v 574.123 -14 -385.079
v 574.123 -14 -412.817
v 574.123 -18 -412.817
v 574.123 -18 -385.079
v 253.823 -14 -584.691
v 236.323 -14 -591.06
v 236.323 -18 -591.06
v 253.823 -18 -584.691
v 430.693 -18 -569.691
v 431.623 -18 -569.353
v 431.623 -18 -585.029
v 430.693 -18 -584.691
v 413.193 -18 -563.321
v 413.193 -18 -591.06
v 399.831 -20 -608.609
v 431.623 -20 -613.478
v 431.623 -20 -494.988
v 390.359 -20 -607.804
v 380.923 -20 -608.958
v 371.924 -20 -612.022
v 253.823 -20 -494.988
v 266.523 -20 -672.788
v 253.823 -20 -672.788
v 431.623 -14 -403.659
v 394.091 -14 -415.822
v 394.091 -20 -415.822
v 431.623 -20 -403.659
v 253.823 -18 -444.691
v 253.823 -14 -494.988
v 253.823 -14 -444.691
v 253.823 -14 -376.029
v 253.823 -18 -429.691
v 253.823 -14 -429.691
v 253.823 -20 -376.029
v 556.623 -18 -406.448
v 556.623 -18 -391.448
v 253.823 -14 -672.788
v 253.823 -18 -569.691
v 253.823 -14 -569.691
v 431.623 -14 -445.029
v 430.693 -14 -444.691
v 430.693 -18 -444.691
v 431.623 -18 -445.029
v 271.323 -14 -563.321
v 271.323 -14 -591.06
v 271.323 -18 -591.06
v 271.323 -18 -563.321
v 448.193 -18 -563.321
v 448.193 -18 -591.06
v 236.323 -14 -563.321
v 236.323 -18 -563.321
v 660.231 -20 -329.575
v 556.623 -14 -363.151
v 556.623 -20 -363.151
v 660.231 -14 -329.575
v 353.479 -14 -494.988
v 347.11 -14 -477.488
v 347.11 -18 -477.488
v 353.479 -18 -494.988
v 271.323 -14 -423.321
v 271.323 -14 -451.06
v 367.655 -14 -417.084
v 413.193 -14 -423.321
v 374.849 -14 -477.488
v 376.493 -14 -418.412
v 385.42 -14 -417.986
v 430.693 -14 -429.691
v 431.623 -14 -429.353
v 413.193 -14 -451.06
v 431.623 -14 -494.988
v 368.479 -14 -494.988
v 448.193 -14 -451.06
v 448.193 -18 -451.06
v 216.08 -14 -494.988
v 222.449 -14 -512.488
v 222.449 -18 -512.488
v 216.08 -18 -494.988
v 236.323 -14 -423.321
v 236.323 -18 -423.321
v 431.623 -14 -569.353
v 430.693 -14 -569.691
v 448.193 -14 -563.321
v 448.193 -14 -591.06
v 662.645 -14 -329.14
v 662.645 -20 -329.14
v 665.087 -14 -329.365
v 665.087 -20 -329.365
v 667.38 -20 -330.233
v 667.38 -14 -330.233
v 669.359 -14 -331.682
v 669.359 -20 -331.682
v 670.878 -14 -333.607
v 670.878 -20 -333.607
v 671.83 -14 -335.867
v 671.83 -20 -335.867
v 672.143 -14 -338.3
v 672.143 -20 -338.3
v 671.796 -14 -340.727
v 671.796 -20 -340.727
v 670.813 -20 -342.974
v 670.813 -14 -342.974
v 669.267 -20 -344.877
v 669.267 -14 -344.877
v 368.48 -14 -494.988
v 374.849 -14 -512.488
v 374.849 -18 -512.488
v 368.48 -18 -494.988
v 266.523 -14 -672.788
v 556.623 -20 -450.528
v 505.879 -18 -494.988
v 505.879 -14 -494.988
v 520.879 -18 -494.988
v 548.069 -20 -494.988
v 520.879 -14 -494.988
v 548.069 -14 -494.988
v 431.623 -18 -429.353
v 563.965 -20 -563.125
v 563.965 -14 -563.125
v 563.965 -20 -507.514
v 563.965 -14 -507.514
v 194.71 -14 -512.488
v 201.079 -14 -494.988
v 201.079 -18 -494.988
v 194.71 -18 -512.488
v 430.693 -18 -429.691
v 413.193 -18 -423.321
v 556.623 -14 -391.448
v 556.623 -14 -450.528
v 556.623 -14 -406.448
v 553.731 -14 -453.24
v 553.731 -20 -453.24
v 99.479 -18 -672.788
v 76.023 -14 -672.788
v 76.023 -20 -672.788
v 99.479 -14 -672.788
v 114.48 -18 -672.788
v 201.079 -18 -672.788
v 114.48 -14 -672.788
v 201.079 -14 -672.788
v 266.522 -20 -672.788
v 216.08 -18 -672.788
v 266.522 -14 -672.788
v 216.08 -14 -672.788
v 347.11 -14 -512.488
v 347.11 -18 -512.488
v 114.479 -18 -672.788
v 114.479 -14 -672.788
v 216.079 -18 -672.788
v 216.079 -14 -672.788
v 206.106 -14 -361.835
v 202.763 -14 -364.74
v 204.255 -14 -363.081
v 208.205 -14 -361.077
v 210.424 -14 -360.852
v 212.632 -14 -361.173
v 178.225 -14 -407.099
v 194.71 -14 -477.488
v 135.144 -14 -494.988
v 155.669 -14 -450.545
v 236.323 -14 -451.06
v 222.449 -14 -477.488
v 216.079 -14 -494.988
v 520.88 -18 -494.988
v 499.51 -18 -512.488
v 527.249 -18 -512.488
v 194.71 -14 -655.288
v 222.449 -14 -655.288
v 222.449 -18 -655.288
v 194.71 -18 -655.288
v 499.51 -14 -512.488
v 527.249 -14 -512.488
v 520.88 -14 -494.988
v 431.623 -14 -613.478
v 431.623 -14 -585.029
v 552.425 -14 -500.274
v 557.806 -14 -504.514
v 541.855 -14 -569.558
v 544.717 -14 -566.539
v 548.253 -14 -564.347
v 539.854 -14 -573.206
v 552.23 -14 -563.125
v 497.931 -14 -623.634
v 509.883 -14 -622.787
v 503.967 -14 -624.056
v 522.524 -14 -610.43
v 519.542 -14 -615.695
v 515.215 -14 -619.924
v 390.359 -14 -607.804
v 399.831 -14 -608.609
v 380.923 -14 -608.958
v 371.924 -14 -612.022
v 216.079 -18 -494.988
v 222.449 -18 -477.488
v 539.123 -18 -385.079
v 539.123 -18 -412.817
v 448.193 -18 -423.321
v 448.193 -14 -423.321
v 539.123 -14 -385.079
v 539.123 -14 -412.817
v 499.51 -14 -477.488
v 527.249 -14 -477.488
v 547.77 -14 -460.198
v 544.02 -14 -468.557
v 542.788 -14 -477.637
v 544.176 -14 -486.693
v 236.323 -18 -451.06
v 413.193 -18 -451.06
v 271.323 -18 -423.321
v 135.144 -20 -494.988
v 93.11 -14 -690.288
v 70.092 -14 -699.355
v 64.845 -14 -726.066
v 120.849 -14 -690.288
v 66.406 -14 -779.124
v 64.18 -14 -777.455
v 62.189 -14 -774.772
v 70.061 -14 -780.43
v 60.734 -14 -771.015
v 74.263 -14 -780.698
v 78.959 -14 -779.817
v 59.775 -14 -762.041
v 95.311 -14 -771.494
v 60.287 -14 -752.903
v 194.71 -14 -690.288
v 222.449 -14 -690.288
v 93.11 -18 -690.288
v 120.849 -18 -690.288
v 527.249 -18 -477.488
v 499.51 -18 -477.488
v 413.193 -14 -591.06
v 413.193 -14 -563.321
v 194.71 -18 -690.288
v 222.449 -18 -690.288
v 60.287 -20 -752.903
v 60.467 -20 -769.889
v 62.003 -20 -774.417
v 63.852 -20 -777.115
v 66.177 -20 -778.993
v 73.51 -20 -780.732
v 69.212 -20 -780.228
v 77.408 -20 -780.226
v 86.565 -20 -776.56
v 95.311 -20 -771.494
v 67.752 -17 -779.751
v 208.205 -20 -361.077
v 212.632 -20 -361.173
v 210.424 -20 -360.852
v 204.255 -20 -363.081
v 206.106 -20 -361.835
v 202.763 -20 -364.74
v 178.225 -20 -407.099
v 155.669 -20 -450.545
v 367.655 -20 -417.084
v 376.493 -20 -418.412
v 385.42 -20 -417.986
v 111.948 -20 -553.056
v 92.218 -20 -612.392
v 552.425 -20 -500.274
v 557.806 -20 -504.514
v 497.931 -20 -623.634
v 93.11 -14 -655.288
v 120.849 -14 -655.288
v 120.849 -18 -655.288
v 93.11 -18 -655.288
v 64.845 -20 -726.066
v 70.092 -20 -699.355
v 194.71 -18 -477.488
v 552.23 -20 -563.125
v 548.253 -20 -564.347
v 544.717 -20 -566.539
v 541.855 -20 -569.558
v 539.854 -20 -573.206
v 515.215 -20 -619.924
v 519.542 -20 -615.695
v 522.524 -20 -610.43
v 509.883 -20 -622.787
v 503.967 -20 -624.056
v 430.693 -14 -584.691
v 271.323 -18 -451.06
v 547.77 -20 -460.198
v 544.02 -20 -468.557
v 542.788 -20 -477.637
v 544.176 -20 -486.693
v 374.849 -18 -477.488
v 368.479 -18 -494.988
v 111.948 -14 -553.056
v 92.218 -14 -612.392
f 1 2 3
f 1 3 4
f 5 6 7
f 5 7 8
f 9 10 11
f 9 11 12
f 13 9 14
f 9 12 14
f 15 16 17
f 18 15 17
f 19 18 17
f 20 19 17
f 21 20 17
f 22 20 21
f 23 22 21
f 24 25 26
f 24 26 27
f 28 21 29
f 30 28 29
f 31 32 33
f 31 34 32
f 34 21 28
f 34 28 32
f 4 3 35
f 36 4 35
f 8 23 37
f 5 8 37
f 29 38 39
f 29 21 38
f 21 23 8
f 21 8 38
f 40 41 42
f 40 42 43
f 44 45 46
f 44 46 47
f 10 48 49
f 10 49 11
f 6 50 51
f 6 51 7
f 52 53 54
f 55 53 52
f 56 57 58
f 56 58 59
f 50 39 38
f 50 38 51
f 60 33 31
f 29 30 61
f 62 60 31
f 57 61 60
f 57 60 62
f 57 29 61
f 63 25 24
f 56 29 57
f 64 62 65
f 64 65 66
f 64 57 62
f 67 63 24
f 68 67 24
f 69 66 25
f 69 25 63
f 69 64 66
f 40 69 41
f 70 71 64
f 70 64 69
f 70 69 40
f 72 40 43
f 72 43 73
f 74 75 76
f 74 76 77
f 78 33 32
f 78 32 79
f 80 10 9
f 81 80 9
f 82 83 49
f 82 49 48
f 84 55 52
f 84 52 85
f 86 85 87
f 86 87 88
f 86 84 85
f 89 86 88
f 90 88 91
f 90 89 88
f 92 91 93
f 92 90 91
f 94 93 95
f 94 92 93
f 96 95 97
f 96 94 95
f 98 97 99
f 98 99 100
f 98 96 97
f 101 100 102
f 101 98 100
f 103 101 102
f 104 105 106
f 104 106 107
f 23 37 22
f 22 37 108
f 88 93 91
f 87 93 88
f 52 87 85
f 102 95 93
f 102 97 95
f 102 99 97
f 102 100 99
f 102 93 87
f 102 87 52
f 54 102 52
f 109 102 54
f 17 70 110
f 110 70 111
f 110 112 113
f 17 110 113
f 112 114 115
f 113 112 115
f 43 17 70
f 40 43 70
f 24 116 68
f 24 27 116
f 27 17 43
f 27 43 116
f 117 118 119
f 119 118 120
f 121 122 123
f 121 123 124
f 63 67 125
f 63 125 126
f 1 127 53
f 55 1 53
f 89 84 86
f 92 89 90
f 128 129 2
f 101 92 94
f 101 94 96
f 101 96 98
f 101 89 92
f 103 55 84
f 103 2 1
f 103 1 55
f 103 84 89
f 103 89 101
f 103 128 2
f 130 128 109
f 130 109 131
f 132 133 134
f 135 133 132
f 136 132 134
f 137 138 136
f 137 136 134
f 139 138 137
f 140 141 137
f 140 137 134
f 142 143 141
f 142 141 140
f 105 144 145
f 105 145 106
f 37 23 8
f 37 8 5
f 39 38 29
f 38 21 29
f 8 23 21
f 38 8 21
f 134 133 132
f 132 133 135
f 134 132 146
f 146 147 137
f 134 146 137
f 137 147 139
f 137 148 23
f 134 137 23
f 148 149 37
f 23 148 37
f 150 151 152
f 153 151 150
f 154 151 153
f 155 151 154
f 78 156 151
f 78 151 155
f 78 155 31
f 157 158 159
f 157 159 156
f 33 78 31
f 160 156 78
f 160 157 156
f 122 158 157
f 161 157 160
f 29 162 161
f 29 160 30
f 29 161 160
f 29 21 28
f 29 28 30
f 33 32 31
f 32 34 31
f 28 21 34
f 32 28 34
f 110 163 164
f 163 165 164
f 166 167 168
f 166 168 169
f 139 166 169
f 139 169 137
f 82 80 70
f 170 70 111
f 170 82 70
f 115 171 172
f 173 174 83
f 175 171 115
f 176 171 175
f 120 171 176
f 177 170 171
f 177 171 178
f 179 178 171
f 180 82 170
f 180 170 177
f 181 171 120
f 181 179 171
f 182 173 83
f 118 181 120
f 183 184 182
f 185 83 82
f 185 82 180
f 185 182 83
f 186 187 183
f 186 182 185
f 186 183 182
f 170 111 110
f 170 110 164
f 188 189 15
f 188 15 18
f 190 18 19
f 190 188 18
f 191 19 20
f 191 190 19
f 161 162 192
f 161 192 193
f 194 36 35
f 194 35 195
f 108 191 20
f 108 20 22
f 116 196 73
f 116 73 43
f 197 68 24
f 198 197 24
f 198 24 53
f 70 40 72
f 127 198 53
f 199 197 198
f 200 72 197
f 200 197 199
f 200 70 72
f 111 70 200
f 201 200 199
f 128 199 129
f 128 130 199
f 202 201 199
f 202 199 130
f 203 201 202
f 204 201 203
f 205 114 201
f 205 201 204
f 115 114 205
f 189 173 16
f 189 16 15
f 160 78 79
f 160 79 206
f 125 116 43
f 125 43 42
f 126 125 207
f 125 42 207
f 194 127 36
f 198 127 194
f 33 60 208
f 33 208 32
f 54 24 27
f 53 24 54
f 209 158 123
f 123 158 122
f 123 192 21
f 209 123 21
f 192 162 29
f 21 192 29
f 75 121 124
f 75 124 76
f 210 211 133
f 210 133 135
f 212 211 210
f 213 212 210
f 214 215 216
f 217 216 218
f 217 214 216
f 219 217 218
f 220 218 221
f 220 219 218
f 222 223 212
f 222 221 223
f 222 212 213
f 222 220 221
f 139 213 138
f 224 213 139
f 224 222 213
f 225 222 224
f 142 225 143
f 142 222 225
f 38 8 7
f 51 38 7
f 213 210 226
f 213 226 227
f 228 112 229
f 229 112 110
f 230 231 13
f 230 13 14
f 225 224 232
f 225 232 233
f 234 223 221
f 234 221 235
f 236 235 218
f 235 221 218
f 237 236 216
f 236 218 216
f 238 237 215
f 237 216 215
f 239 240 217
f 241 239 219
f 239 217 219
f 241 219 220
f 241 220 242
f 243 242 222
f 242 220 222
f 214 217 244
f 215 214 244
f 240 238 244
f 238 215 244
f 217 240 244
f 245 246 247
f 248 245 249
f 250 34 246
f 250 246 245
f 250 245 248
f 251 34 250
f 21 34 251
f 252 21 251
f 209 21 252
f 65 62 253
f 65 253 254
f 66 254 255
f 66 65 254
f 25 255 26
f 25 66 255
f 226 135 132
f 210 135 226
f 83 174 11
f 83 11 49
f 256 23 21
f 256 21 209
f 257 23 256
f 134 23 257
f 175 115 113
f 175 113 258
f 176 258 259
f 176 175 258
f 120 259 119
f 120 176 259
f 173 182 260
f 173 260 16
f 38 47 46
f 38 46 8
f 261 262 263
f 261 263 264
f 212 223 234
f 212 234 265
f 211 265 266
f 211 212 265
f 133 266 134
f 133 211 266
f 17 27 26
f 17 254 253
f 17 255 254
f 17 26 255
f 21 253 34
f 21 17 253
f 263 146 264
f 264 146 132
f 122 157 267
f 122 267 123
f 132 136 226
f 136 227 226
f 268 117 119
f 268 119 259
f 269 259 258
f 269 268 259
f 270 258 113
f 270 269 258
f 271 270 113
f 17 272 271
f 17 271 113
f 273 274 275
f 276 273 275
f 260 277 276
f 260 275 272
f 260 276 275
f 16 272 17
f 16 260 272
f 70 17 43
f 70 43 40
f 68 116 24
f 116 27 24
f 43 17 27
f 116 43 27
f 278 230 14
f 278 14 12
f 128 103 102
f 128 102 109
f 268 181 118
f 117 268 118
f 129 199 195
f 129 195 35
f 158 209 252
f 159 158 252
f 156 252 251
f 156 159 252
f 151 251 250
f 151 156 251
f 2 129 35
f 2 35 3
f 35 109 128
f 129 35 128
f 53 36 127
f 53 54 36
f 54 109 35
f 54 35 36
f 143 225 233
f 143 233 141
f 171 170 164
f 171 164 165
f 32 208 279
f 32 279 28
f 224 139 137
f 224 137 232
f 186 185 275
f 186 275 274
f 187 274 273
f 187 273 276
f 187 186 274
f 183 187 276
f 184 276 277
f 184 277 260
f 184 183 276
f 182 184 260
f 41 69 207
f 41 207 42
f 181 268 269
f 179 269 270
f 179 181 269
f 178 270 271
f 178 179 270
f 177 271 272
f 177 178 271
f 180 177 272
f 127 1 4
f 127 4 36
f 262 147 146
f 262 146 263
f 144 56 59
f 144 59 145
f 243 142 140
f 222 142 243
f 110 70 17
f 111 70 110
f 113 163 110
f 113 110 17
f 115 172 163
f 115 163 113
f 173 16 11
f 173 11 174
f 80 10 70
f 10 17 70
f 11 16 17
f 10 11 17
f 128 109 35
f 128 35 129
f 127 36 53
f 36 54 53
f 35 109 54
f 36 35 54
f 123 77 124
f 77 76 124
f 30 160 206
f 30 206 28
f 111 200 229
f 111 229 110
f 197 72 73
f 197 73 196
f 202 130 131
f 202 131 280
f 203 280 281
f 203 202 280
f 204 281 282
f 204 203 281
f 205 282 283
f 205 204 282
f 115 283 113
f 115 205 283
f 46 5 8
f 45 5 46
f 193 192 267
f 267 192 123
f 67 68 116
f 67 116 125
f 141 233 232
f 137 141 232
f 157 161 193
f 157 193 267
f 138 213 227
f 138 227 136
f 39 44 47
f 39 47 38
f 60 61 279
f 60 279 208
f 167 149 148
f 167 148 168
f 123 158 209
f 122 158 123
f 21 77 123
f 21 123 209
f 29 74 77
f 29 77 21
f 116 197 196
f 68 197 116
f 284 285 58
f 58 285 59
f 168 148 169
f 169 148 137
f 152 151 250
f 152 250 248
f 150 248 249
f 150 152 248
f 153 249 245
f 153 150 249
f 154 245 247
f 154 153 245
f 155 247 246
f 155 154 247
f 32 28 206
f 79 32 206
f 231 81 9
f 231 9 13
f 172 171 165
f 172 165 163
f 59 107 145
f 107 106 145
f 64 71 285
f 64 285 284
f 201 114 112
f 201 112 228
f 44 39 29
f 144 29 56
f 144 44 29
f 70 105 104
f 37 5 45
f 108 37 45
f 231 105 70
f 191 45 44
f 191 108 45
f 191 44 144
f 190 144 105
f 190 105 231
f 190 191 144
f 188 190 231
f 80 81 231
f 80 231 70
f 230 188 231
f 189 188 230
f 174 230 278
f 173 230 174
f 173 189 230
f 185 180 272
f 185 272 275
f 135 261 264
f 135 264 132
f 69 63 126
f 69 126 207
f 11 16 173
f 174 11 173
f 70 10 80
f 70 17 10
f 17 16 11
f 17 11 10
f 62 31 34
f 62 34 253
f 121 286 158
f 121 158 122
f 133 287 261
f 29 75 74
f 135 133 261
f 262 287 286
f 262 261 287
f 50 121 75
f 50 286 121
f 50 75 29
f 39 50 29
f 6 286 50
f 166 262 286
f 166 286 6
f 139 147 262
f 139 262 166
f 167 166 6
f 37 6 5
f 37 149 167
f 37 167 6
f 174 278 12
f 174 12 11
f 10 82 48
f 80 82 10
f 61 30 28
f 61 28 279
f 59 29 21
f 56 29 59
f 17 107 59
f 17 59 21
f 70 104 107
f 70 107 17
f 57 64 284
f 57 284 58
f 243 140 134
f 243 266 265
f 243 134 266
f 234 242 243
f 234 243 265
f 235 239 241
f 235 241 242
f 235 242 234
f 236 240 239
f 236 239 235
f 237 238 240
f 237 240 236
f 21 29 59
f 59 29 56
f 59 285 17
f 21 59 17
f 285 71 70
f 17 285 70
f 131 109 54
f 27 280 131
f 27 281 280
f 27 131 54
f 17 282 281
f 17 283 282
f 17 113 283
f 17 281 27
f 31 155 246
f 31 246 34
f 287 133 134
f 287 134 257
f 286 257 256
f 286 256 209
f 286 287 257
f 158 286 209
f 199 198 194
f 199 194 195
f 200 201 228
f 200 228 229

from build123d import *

# Parameters (mm, degrees)
BOSS_EXTRUDE1_DEPTH            = 40
F_13_0_13_DIAMETER_HOLE1_D     = 13
F_13_0_13_DIAMETER_HOLE1_DEPTH = 29
CUT_EXTRUDE8_DEPTH             = 16
SKETCH14_R                     = 6.35
SKETCH14_R_2                   = 5.502637429
CUT_EXTRUDE9_DEPTH             = 10
CUT_EXTRUDE10_DEPTH            = 10
BOSS_EXTRUDE2_DEPTH            = 24
BOSS_EXTRUDE3_START            = -40
BOSS_EXTRUDE3_DEPTH            = 40
CUT_EXTRUDE11_DEPTH            = 34
CUT_EXTRUDE12_START            = -672.787815527
CUT_EXTRUDE12_OUTLINE_W        = 473
CUT_EXTRUDE12_OUTLINE_H        = 6
CUT_EXTRUDE12_DEPTH            = 0.0001
CUT_EXTRUDE12_START_2          = -494.987815527
CUT_EXTRUDE12_2_OUTLINE_W      = 473
CUT_EXTRUDE12_2_OUTLINE_H      = 6
CUT_EXTRUDE12_2_DEPTH          = 0.0001
CUT_EXTRUDE13_START            = 253.822659289
CUT_EXTRUDE13_OUTLINE_W        = 6
CUT_EXTRUDE13_OUTLINE_H        = 27.629935764
CUT_EXTRUDE13_OUTLINE_H_2      = 46.868729155
CUT_EXTRUDE13_OUTLINE_H_3      = 44.459740095
CUT_EXTRUDE13_DEPTH            = 0.0001
CUT_EXTRUDE13_START_2          = 431.622659289
CUT_EXTRUDE13_2_OUTLINE_W      = 6
CUT_EXTRUDE13_2_OUTLINE_H      = 46.868729155
CUT_EXTRUDE13_2_OUTLINE_H_2    = 44.459740095
CUT_EXTRUDE13_2_DEPTH          = 0.0001
CUT_EXTRUDE13_START_3          = 556.622559289
CUT_EXTRUDE13_3_OUTLINE_W      = 6
CUT_EXTRUDE13_3_OUTLINE_H      = 87.376935067
CUT_EXTRUDE13_3_DEPTH          = 0.0001
CUT_EXTRUDE14_DEPTH            = 4


# Read off the part's stored shape, not the designer's step: Cut-Extrude12, Cut-Extrude13
with BuildPart() as part:
    # Sketch1 → Boss-Extrude1 (new body)
    with BuildSketch(Plane(origin=(0, 20, 0), x_dir=(1, 0, 0), z_dir=(0, 1, 0))):
        with BuildLine():
            Line((563.96485174, 507.513718698), (563.96485174, 562.736423486))
            Line((563.96485174, 562.736423486), (554.690781869, 562.894803628))
            ThreePointArc((554.690781869, 562.894803628), (545.704943994, 565.795150829), (539.853906856, 573.206133263))
            Line((539.853906856, 573.206133263), (522.524343645, 610.429990226))
            ThreePointArc((522.524343645, 610.429990226), (512.649800976, 621.543175495), (497.931198247, 623.634159339))
            Line((497.931198247, 623.634159339), (399.830947056, 608.608698386))
            ThreePointArc((399.830947056, 608.608698386), (385.610832142, 608.137408426), (371.923585817, 612.02238853))
            Line((371.923585817, 612.02238853), (95.310746964, 771.494097008))
            add(Edge.make_bspline(
                [(60.287007155, 752.902507236), (59.408683029, 762.769524202), (58.560960325, 776.204376236), (76.94287295, 783.298520304), (86.753146937, 776.493697586), (95.310746964, 771.494097008)],
                knots=[0, 0, 0, 0, 0.5, 0.5, 1, 1, 1, 1], degree=3))
            ThreePointArc((60.287007155, 752.902507236), (112.407005996, 551.803928099), (202.762947005, 364.739937083))
            ThreePointArc((202.762947005, 364.739937083), (207.132055784, 361.391783138), (212.632195034, 361.173346422))
            Line((212.632195034, 361.173346422), (367.65464082, 417.084401042))
            ThreePointArc((367.65464082, 417.084401042), (380.966681082, 418.419109504), (394.090964942, 415.82198883))
            Line((394.090964942, 415.82198883), (660.231475403, 329.574923038))
            ThreePointArc((660.231475403, 329.574923038), (670.878462163, 333.606992627), (669.266978502, 344.877264703))
            Line((669.266978502, 344.877264703), (553.73117364, 453.239940989))
            ThreePointArc((553.73117364, 453.239940989), (543.342125743, 483.300566911), (563.96485174, 507.513718698))
        make_face()
    extrude(amount=-BOSS_EXTRUDE1_DEPTH)

    # Ø13.0 (13) Diameter Hole1
    with Locations(Plane(origin=(0, 20, 0), x_dir=(1, 0, 0), z_dir=(0, 1, 0))):
        with Locations((274.335910331, 496.233480955), (274.335910331, 579.213058938)):
            Hole(F_13_0_13_DIAMETER_HOLE1_D / 2, depth=F_13_0_13_DIAMETER_HOLE1_DEPTH)

    # Sketch13 → Cut-Extrude8 (cut)
    with BuildSketch(Plane(origin=(0, 20, 0), x_dir=(1, 0, 0), z_dir=(0, 1, 0))):
        with BuildLine():
            Line((563.96485174, 563.125071092), (496.273234513, 563.125071092))
            ThreePointArc((496.273234513, 563.125071092), (492.20587406, 561.651450789), (490.026307291, 557.914544776))
            ThreePointArc((490.026307291, 557.914544776), (487.96485174, 535.125071092), (490.026307291, 512.335597408))
            ThreePointArc((490.026307291, 512.335597408), (492.20587406, 508.598691395), (496.273234513, 507.125071092))
            Line((496.273234513, 507.125071092), (563.96485174, 507.125071092))
            Line((563.96485174, 507.125071092), (563.96485174, 563.125071092))
        make_face()
    extrude(amount=-CUT_EXTRUDE8_DEPTH, mode=Mode.SUBTRACT)

    # Sketch14 → Cut-Extrude9 (cut)
    with BuildSketch(Plane(origin=(0, 20, 0), x_dir=(1, 0, 0), z_dir=(0, 1, 0))):
        with Locations(Location((303.81485174, 498.131405852, 0), (0, 0, 270))):
            Circle(SKETCH14_R)
        with Locations(Location((298.641153596, 572.118736332, 0), (0, 0, 270))):
            Circle(SKETCH14_R_2)
    extrude(amount=-CUT_EXTRUDE9_DEPTH, mode=Mode.SUBTRACT)

    # Sketch17 → Cut-Extrude10 (cut)
    with BuildSketch(Plane(origin=(0, 20, 0), x_dir=(1, 0, 0), z_dir=(0, 1, 0))):
        with BuildLine():
            Line((481.61485174, 499.042173829), (481.61485174, 571.207968354))
            ThreePointArc((481.61485174, 571.207968354), (473.296544122, 580.314612527), (463.475969831, 572.852606745))
            Line((463.475969831, 572.852606745), (457.73885174, 541.475071092))
            Line((457.73885174, 541.475071092), (457.73885174, 528.775071092))
            Line((457.73885174, 528.775071092), (463.475969831, 497.397535439))
            ThreePointArc((463.475969831, 497.397535439), (473.296544122, 489.935529657), (481.61485174, 499.042173829))
        make_face()
        with BuildLine():
            Line((420.65485174, 499.042173829), (420.65485174, 571.207968354))
            ThreePointArc((420.65485174, 571.207968354), (412.336544122, 580.314612527), (402.515969831, 572.852606745))
            Line((402.515969831, 572.852606745), (396.77885174, 541.475071092))
            Line((396.77885174, 541.475071092), (396.77885174, 528.775071092))
            Line((396.77885174, 528.775071092), (402.515969831, 497.397535439))
            ThreePointArc((402.515969831, 497.397535439), (412.336544122, 489.935529657), (420.65485174, 499.042173829))
        make_face()
        with BuildLine():
            Line((357.072977222, 497.929527206), (372.077089581, 568.518325976))
            ThreePointArc((372.077089581, 568.518325976), (365.83393473, 579.155441526), (354.67652531, 573.898310679))
            Line((354.67652531, 573.898310679), (342.541020523, 544.399263386))
            Line((342.541020523, 544.399263386), (339.90054205, 531.976788856))
            Line((339.90054205, 531.976788856), (338.988533854, 500.092113718))
            ThreePointArc((338.988533854, 500.092113718), (347.043066796, 490.751358459), (357.072977222, 497.929527206))
        make_face()
    extrude(amount=-CUT_EXTRUDE10_DEPTH, mode=Mode.SUBTRACT)

    # Sketch19 → Boss-Extrude2 (add)
    with BuildSketch(Plane(origin=(0, 4, 0), x_dir=(1, 0, 0), z_dir=(0, 1, 0))):
        with BuildLine():
            Line((552.229738554, 563.125071092), (563.96485174, 563.125071092))
            Line((563.96485174, 563.125071092), (563.96485174, 562.736423486))
            Line((563.96485174, 562.736423486), (554.690781869, 562.894803628))
            ThreePointArc((554.690781869, 562.894803628), (553.455870496, 562.963021133), (552.229738554, 563.125071092))
        make_face()
    extrude(amount=-BOSS_EXTRUDE2_DEPTH)

    # Sketch20 → Boss-Extrude3 (add)
    with BuildSketch(Plane.XZ.offset(20).offset(BOSS_EXTRUDE3_START)):
        with BuildLine():
            Line((553.73117364, -453.239940989), (669.266978502, -344.877264703))
            ThreePointArc((669.266978502, -344.877264703), (670.878462163, -333.606992627), (660.231475403, -329.574923038))
            Line((660.231475403, -329.574923038), (394.090964942, -415.82198883))
            ThreePointArc((394.090964942, -415.82198883), (380.966681082, -418.419109504), (367.65464082, -417.084401042))
            Line((367.65464082, -417.084401042), (212.632195034, -361.173346422))
            ThreePointArc((212.632195034, -361.173346422), (207.132055784, -361.391783138), (202.762947005, -364.739937083))
            ThreePointArc((202.762947005, -364.739937083), (112.407005996, -551.803928099), (60.287007155, -752.902507236))
            add(Edge.make_bspline(
                [(60.287007155, -752.902507236), (59.408683029, -762.769524202), (58.560960325, -776.204376236), (76.94287295, -783.298520304), (86.753146937, -776.493697586), (95.310746964, -771.494097008)],
                knots=[0, 0, 0, 0, 0.5, 0.5, 1, 1, 1, 1], degree=3))
            Line((95.310746964, -771.494097008), (371.923585817, -612.02238853))
            ThreePointArc((371.923585817, -612.02238853), (385.610832142, -608.137408426), (399.830947056, -608.608698386))
            Line((399.830947056, -608.608698386), (497.931198247, -623.634159339))
            ThreePointArc((497.931198247, -623.634159339), (512.649800976, -621.543175495), (522.524343645, -610.429990226))
            Line((522.524343645, -610.429990226), (539.853906856, -573.206133263))
            ThreePointArc((539.853906856, -573.206133263), (544.716962334, -566.539161561), (552.229738554, -563.125071092))
            Line((552.229738554, -563.125071092), (563.96485174, -563.125071092))
            Line((563.96485174, -563.125071092), (563.96485174, -507.513718698))
            ThreePointArc((563.96485174, -507.513718698), (543.342125743, -483.300566911), (553.73117364, -453.239940989))
        make_face()
    extrude(amount=BOSS_EXTRUDE3_DEPTH)

    # Sketch21 → Cut-Extrude11 (cut)
    with BuildSketch(Plane(origin=(0, 20, 0), x_dir=(1, 0, 0), z_dir=(0, 1, 0))):
        with BuildLine():
            Line((563.96485174, 507.513718698), (563.96485174, 563.125071092))
            Line((563.96485174, 563.125071092), (552.229738554, 563.125071092))
            ThreePointArc((552.229738554, 563.125071092), (544.716962334, 566.539161561), (539.853906856, 573.206133263))
            Line((539.853906856, 573.206133263), (522.524343645, 610.429990226))
            ThreePointArc((522.524343645, 610.429990226), (512.649800976, 621.543175495), (497.931198247, 623.634159339))
            Line((497.931198247, 623.634159339), (399.830947056, 608.608698386))
            ThreePointArc((399.830947056, 608.608698386), (385.610832142, 608.137408426), (371.923585817, 612.02238853))
            Line((371.923585817, 612.02238853), (95.310746964, 771.494097008))
            add(Edge.make_bspline(
                [(95.310746964, 771.494097008), (86.753146937, 776.493697586), (76.94287295, 783.298520304), (58.560960325, 776.204376236), (59.408683029, 762.769524202), (60.287007155, 752.902507236)],
                knots=[0, 0, 0, 0, 0.5, 0.5, 1, 1, 1, 1], degree=3))
            ThreePointArc((60.287007155, 752.902507236), (112.407005996, 551.803928099), (202.762947005, 364.739937083))
            ThreePointArc((202.762947005, 364.739937083), (207.132055784, 361.391783138), (212.632195034, 361.173346422))
            Line((212.632195034, 361.173346422), (367.65464082, 417.084401042))
            ThreePointArc((367.65464082, 417.084401042), (380.966681082, 418.419109504), (394.090964942, 415.82198883))
            Line((394.090964942, 415.82198883), (660.231475403, 329.574923038))
            ThreePointArc((660.231475403, 329.574923038), (670.878462163, 333.606992627), (669.266978502, 344.877264703))
            Line((669.266978502, 344.877264703), (553.73117364, 453.239940989))
            ThreePointArc((553.73117364, 453.239940989), (543.342125743, 483.300566911), (563.96485174, 507.513718698))
        make_face()
    extrude(amount=-CUT_EXTRUDE11_DEPTH, mode=Mode.SUBTRACT)

    # Cut-Extrude12 outline → Cut-Extrude12 (cut)
    with BuildSketch(Plane.XY.offset(CUT_EXTRUDE12_START)):
        with Locations((312.5, -17)):
            Rectangle(CUT_EXTRUDE12_OUTLINE_W, CUT_EXTRUDE12_OUTLINE_H)
    extrude(amount=CUT_EXTRUDE12_DEPTH, mode=Mode.SUBTRACT)

    # Cut-Extrude12 2 outline → Cut-Extrude12 2 (cut)
    with BuildSketch(Plane.XY.offset(CUT_EXTRUDE12_START_2)):
        with Locations((312.5, -17)):
            Rectangle(CUT_EXTRUDE12_2_OUTLINE_W, CUT_EXTRUDE12_2_OUTLINE_H)
    extrude(amount=CUT_EXTRUDE12_2_DEPTH, mode=Mode.SUBTRACT)

    # Cut-Extrude13 outline → Cut-Extrude13 (cut)
    with BuildSketch(Plane.YZ.offset(CUT_EXTRUDE13_START)):
        with Locations((-17, -389.844278395)):
            Rectangle(CUT_EXTRUDE13_OUTLINE_W, CUT_EXTRUDE13_OUTLINE_H)
        with Locations((-17, -427.093610855)):
            Rectangle(CUT_EXTRUDE13_OUTLINE_W, CUT_EXTRUDE13_OUTLINE_H_2)
        with Locations((-17, -472.75784548)):
            Rectangle(CUT_EXTRUDE13_OUTLINE_W, CUT_EXTRUDE13_OUTLINE_H_3)
        Polygon((-14, -613.478055243), (-14, -494.987815527), (-20, -494.987715527), (-20, -613.478055243), align=None)
        Polygon((-14, -624.110525751), (-14, -613.478055243), (-20, -613.478055243), (-20, -624.110525751), (-20, -672.787715527), (-14, -672.787715527), align=None)
    extrude(amount=CUT_EXTRUDE13_DEPTH, mode=Mode.SUBTRACT)

    # Cut-Extrude13 2 outline → Cut-Extrude13 2 (cut)
    with BuildSketch(Plane.YZ.offset(CUT_EXTRUDE13_START_2)):
        with Locations((-17, -427.093610855)):
            Rectangle(CUT_EXTRUDE13_2_OUTLINE_W, CUT_EXTRUDE13_2_OUTLINE_H)
        with Locations((-17, -472.75784548)):
            Rectangle(CUT_EXTRUDE13_2_OUTLINE_W, CUT_EXTRUDE13_2_OUTLINE_H_2)
        Polygon((-14, -613.478055243), (-14, -494.987815527), (-20, -494.987715527), (-20, -613.478055243), align=None)
    extrude(amount=CUT_EXTRUDE13_2_DEPTH, mode=Mode.SUBTRACT)

    # Cut-Extrude13 3 outline → Cut-Extrude13 3 (cut)
    with BuildSketch(Plane.YZ.offset(CUT_EXTRUDE13_START_3)):
        with Locations((-17, -406.839507899)):
            Rectangle(CUT_EXTRUDE13_3_OUTLINE_W, CUT_EXTRUDE13_3_OUTLINE_H)
    extrude(amount=CUT_EXTRUDE13_3_DEPTH, mode=Mode.SUBTRACT)

    # Sketch27 → Cut-Extrude14 (cut)
    with BuildSketch(Plane(origin=(0, -14, 0), x_dir=(1, 0, 0), z_dir=(0, 1, 0))):
        Polygon((194.71002043, 690.287715527), (222.448978629, 690.287715527), (216.079499529, 672.787715527), (222.448978629, 655.287715527), (194.71002043, 655.287715527), (201.079499529, 672.787715527), align=None)
        Polygon((99.479499529, 672.787715527), (93.11002043, 690.287715527), (120.848978629, 690.287715527), (114.479499529, 672.787715527), (120.848978629, 655.287715527), (93.11002043, 655.287715527), align=None)
        Polygon((201.079499529, 494.987715527), (194.71002043, 512.487715527), (222.448978629, 512.487715527), (216.079499529, 494.987715527), (222.448978629, 477.487715527), (194.71002043, 477.487715527), align=None)
        Polygon((353.479499529, 494.987715527), (347.11002043, 512.487715527), (374.848978629, 512.487715527), (368.479499529, 494.987715527), (374.848978629, 477.487715527), (347.11002043, 477.487715527), align=None)
        Polygon((505.879499529, 494.987715527), (499.51002043, 512.487715527), (527.248978629, 512.487715527), (520.879499529, 494.987715527), (527.248978629, 477.487715527), (499.51002043, 477.487715527), align=None)
        Polygon((271.322759289, 591.06039229), (271.322759289, 563.321434091), (253.822759289, 569.690913191), (236.322759289, 563.321434091), (236.322759289, 591.06039229), (253.822759289, 584.690913191), align=None)
        Polygon((253.822759289, 444.690913191), (271.322759289, 451.06039229), (271.322759289, 423.321434091), (253.822759289, 429.690913191), (236.322759289, 423.321434091), (236.322759289, 451.06039229), align=None)
        Polygon((430.693175696, 444.690913191), (448.193175696, 451.06039229), (448.193175696, 423.321434091), (430.693175696, 429.690913191), (413.193175696, 423.321434091), (413.193175696, 451.06039229), align=None)
        Polygon((430.693175696, 584.690913191), (448.193175696, 591.06039229), (448.193175696, 563.321434091), (430.693175696, 569.690913191), (413.193175696, 563.321434091), (413.193175696, 591.06039229), align=None)
        Polygon((574.122659289, 412.817458901), (574.122659289, 385.078500701), (556.622659289, 391.447979801), (539.122659289, 385.078500701), (539.122659289, 412.817458901), (556.622659289, 406.447979801), align=None)
    extrude(amount=-CUT_EXTRUDE14_DEPTH, mode=Mode.SUBTRACT)


solid = part.part
